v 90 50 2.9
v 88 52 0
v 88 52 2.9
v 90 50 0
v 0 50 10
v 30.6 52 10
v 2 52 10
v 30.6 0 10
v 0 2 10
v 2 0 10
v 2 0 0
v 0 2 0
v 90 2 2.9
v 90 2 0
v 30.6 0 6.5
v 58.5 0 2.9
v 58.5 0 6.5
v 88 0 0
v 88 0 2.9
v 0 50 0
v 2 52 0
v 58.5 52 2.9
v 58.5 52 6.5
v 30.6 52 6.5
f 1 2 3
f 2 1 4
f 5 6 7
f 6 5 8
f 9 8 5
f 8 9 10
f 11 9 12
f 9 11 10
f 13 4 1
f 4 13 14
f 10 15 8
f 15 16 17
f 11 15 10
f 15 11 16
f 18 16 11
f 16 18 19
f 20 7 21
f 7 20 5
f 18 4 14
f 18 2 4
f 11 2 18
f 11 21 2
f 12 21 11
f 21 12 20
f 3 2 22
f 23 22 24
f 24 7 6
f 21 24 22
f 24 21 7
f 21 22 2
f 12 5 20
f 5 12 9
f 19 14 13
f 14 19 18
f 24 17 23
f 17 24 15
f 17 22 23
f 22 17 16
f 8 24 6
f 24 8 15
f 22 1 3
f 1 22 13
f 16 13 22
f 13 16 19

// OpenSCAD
$fn = 32;

// ----------------------------------------------------------------------
// Stepped bar: twostep, 90 x 52 x 10/2.9 mm
// ----------------------------------------------------------------------

// --- parameters (mm) ---
bar_l = 90;               // bar length, X
bar_w = 52;               // bar width, Y
plate_t = 10;             // thickness of the thick zone, Z
thin_t = 2.9;             // thickness of the thin zone
corner_c = 2;             // corner chamfer of the bar
step_cut = 7.1;           // material removed from the thin zone
stair1_x = 30.6;          // position of the first stair
stair2_x = 58.5;          // position of the second stair
mid_t = 6.5;              // thickness of the middle zone
depth_1 = 3.5;            // depth of cut 1 from the top face
depth_2 = 7.1;            // depth of cut 2 from the top face

profile = [[2, 0], [88, 0], [90, 2], [90, 50], [88, 52], [2, 52], [0, 50], [0, 2]];  // primary outline, 8 points, counter clockwise
void_1 = [[30.6, -1], [58.5, -1], [58.5, 53], [30.6, 53]];  // first stair, 4 points
void_2 = [[58.5, -1], [91, -1], [91, 53], [58.5, 53]];  // second stair, 4 points

// --- the one profile operation ---
difference() {
  linear_extrude(height = plate_t) polygon(points = profile);
  translate([0, 0, plate_t - depth_1])
    linear_extrude(height = depth_1 + 1) polygon(points = void_1);
  translate([0, 0, plate_t - depth_2])
    linear_extrude(height = depth_2 + 1) polygon(points = void_2);
}
